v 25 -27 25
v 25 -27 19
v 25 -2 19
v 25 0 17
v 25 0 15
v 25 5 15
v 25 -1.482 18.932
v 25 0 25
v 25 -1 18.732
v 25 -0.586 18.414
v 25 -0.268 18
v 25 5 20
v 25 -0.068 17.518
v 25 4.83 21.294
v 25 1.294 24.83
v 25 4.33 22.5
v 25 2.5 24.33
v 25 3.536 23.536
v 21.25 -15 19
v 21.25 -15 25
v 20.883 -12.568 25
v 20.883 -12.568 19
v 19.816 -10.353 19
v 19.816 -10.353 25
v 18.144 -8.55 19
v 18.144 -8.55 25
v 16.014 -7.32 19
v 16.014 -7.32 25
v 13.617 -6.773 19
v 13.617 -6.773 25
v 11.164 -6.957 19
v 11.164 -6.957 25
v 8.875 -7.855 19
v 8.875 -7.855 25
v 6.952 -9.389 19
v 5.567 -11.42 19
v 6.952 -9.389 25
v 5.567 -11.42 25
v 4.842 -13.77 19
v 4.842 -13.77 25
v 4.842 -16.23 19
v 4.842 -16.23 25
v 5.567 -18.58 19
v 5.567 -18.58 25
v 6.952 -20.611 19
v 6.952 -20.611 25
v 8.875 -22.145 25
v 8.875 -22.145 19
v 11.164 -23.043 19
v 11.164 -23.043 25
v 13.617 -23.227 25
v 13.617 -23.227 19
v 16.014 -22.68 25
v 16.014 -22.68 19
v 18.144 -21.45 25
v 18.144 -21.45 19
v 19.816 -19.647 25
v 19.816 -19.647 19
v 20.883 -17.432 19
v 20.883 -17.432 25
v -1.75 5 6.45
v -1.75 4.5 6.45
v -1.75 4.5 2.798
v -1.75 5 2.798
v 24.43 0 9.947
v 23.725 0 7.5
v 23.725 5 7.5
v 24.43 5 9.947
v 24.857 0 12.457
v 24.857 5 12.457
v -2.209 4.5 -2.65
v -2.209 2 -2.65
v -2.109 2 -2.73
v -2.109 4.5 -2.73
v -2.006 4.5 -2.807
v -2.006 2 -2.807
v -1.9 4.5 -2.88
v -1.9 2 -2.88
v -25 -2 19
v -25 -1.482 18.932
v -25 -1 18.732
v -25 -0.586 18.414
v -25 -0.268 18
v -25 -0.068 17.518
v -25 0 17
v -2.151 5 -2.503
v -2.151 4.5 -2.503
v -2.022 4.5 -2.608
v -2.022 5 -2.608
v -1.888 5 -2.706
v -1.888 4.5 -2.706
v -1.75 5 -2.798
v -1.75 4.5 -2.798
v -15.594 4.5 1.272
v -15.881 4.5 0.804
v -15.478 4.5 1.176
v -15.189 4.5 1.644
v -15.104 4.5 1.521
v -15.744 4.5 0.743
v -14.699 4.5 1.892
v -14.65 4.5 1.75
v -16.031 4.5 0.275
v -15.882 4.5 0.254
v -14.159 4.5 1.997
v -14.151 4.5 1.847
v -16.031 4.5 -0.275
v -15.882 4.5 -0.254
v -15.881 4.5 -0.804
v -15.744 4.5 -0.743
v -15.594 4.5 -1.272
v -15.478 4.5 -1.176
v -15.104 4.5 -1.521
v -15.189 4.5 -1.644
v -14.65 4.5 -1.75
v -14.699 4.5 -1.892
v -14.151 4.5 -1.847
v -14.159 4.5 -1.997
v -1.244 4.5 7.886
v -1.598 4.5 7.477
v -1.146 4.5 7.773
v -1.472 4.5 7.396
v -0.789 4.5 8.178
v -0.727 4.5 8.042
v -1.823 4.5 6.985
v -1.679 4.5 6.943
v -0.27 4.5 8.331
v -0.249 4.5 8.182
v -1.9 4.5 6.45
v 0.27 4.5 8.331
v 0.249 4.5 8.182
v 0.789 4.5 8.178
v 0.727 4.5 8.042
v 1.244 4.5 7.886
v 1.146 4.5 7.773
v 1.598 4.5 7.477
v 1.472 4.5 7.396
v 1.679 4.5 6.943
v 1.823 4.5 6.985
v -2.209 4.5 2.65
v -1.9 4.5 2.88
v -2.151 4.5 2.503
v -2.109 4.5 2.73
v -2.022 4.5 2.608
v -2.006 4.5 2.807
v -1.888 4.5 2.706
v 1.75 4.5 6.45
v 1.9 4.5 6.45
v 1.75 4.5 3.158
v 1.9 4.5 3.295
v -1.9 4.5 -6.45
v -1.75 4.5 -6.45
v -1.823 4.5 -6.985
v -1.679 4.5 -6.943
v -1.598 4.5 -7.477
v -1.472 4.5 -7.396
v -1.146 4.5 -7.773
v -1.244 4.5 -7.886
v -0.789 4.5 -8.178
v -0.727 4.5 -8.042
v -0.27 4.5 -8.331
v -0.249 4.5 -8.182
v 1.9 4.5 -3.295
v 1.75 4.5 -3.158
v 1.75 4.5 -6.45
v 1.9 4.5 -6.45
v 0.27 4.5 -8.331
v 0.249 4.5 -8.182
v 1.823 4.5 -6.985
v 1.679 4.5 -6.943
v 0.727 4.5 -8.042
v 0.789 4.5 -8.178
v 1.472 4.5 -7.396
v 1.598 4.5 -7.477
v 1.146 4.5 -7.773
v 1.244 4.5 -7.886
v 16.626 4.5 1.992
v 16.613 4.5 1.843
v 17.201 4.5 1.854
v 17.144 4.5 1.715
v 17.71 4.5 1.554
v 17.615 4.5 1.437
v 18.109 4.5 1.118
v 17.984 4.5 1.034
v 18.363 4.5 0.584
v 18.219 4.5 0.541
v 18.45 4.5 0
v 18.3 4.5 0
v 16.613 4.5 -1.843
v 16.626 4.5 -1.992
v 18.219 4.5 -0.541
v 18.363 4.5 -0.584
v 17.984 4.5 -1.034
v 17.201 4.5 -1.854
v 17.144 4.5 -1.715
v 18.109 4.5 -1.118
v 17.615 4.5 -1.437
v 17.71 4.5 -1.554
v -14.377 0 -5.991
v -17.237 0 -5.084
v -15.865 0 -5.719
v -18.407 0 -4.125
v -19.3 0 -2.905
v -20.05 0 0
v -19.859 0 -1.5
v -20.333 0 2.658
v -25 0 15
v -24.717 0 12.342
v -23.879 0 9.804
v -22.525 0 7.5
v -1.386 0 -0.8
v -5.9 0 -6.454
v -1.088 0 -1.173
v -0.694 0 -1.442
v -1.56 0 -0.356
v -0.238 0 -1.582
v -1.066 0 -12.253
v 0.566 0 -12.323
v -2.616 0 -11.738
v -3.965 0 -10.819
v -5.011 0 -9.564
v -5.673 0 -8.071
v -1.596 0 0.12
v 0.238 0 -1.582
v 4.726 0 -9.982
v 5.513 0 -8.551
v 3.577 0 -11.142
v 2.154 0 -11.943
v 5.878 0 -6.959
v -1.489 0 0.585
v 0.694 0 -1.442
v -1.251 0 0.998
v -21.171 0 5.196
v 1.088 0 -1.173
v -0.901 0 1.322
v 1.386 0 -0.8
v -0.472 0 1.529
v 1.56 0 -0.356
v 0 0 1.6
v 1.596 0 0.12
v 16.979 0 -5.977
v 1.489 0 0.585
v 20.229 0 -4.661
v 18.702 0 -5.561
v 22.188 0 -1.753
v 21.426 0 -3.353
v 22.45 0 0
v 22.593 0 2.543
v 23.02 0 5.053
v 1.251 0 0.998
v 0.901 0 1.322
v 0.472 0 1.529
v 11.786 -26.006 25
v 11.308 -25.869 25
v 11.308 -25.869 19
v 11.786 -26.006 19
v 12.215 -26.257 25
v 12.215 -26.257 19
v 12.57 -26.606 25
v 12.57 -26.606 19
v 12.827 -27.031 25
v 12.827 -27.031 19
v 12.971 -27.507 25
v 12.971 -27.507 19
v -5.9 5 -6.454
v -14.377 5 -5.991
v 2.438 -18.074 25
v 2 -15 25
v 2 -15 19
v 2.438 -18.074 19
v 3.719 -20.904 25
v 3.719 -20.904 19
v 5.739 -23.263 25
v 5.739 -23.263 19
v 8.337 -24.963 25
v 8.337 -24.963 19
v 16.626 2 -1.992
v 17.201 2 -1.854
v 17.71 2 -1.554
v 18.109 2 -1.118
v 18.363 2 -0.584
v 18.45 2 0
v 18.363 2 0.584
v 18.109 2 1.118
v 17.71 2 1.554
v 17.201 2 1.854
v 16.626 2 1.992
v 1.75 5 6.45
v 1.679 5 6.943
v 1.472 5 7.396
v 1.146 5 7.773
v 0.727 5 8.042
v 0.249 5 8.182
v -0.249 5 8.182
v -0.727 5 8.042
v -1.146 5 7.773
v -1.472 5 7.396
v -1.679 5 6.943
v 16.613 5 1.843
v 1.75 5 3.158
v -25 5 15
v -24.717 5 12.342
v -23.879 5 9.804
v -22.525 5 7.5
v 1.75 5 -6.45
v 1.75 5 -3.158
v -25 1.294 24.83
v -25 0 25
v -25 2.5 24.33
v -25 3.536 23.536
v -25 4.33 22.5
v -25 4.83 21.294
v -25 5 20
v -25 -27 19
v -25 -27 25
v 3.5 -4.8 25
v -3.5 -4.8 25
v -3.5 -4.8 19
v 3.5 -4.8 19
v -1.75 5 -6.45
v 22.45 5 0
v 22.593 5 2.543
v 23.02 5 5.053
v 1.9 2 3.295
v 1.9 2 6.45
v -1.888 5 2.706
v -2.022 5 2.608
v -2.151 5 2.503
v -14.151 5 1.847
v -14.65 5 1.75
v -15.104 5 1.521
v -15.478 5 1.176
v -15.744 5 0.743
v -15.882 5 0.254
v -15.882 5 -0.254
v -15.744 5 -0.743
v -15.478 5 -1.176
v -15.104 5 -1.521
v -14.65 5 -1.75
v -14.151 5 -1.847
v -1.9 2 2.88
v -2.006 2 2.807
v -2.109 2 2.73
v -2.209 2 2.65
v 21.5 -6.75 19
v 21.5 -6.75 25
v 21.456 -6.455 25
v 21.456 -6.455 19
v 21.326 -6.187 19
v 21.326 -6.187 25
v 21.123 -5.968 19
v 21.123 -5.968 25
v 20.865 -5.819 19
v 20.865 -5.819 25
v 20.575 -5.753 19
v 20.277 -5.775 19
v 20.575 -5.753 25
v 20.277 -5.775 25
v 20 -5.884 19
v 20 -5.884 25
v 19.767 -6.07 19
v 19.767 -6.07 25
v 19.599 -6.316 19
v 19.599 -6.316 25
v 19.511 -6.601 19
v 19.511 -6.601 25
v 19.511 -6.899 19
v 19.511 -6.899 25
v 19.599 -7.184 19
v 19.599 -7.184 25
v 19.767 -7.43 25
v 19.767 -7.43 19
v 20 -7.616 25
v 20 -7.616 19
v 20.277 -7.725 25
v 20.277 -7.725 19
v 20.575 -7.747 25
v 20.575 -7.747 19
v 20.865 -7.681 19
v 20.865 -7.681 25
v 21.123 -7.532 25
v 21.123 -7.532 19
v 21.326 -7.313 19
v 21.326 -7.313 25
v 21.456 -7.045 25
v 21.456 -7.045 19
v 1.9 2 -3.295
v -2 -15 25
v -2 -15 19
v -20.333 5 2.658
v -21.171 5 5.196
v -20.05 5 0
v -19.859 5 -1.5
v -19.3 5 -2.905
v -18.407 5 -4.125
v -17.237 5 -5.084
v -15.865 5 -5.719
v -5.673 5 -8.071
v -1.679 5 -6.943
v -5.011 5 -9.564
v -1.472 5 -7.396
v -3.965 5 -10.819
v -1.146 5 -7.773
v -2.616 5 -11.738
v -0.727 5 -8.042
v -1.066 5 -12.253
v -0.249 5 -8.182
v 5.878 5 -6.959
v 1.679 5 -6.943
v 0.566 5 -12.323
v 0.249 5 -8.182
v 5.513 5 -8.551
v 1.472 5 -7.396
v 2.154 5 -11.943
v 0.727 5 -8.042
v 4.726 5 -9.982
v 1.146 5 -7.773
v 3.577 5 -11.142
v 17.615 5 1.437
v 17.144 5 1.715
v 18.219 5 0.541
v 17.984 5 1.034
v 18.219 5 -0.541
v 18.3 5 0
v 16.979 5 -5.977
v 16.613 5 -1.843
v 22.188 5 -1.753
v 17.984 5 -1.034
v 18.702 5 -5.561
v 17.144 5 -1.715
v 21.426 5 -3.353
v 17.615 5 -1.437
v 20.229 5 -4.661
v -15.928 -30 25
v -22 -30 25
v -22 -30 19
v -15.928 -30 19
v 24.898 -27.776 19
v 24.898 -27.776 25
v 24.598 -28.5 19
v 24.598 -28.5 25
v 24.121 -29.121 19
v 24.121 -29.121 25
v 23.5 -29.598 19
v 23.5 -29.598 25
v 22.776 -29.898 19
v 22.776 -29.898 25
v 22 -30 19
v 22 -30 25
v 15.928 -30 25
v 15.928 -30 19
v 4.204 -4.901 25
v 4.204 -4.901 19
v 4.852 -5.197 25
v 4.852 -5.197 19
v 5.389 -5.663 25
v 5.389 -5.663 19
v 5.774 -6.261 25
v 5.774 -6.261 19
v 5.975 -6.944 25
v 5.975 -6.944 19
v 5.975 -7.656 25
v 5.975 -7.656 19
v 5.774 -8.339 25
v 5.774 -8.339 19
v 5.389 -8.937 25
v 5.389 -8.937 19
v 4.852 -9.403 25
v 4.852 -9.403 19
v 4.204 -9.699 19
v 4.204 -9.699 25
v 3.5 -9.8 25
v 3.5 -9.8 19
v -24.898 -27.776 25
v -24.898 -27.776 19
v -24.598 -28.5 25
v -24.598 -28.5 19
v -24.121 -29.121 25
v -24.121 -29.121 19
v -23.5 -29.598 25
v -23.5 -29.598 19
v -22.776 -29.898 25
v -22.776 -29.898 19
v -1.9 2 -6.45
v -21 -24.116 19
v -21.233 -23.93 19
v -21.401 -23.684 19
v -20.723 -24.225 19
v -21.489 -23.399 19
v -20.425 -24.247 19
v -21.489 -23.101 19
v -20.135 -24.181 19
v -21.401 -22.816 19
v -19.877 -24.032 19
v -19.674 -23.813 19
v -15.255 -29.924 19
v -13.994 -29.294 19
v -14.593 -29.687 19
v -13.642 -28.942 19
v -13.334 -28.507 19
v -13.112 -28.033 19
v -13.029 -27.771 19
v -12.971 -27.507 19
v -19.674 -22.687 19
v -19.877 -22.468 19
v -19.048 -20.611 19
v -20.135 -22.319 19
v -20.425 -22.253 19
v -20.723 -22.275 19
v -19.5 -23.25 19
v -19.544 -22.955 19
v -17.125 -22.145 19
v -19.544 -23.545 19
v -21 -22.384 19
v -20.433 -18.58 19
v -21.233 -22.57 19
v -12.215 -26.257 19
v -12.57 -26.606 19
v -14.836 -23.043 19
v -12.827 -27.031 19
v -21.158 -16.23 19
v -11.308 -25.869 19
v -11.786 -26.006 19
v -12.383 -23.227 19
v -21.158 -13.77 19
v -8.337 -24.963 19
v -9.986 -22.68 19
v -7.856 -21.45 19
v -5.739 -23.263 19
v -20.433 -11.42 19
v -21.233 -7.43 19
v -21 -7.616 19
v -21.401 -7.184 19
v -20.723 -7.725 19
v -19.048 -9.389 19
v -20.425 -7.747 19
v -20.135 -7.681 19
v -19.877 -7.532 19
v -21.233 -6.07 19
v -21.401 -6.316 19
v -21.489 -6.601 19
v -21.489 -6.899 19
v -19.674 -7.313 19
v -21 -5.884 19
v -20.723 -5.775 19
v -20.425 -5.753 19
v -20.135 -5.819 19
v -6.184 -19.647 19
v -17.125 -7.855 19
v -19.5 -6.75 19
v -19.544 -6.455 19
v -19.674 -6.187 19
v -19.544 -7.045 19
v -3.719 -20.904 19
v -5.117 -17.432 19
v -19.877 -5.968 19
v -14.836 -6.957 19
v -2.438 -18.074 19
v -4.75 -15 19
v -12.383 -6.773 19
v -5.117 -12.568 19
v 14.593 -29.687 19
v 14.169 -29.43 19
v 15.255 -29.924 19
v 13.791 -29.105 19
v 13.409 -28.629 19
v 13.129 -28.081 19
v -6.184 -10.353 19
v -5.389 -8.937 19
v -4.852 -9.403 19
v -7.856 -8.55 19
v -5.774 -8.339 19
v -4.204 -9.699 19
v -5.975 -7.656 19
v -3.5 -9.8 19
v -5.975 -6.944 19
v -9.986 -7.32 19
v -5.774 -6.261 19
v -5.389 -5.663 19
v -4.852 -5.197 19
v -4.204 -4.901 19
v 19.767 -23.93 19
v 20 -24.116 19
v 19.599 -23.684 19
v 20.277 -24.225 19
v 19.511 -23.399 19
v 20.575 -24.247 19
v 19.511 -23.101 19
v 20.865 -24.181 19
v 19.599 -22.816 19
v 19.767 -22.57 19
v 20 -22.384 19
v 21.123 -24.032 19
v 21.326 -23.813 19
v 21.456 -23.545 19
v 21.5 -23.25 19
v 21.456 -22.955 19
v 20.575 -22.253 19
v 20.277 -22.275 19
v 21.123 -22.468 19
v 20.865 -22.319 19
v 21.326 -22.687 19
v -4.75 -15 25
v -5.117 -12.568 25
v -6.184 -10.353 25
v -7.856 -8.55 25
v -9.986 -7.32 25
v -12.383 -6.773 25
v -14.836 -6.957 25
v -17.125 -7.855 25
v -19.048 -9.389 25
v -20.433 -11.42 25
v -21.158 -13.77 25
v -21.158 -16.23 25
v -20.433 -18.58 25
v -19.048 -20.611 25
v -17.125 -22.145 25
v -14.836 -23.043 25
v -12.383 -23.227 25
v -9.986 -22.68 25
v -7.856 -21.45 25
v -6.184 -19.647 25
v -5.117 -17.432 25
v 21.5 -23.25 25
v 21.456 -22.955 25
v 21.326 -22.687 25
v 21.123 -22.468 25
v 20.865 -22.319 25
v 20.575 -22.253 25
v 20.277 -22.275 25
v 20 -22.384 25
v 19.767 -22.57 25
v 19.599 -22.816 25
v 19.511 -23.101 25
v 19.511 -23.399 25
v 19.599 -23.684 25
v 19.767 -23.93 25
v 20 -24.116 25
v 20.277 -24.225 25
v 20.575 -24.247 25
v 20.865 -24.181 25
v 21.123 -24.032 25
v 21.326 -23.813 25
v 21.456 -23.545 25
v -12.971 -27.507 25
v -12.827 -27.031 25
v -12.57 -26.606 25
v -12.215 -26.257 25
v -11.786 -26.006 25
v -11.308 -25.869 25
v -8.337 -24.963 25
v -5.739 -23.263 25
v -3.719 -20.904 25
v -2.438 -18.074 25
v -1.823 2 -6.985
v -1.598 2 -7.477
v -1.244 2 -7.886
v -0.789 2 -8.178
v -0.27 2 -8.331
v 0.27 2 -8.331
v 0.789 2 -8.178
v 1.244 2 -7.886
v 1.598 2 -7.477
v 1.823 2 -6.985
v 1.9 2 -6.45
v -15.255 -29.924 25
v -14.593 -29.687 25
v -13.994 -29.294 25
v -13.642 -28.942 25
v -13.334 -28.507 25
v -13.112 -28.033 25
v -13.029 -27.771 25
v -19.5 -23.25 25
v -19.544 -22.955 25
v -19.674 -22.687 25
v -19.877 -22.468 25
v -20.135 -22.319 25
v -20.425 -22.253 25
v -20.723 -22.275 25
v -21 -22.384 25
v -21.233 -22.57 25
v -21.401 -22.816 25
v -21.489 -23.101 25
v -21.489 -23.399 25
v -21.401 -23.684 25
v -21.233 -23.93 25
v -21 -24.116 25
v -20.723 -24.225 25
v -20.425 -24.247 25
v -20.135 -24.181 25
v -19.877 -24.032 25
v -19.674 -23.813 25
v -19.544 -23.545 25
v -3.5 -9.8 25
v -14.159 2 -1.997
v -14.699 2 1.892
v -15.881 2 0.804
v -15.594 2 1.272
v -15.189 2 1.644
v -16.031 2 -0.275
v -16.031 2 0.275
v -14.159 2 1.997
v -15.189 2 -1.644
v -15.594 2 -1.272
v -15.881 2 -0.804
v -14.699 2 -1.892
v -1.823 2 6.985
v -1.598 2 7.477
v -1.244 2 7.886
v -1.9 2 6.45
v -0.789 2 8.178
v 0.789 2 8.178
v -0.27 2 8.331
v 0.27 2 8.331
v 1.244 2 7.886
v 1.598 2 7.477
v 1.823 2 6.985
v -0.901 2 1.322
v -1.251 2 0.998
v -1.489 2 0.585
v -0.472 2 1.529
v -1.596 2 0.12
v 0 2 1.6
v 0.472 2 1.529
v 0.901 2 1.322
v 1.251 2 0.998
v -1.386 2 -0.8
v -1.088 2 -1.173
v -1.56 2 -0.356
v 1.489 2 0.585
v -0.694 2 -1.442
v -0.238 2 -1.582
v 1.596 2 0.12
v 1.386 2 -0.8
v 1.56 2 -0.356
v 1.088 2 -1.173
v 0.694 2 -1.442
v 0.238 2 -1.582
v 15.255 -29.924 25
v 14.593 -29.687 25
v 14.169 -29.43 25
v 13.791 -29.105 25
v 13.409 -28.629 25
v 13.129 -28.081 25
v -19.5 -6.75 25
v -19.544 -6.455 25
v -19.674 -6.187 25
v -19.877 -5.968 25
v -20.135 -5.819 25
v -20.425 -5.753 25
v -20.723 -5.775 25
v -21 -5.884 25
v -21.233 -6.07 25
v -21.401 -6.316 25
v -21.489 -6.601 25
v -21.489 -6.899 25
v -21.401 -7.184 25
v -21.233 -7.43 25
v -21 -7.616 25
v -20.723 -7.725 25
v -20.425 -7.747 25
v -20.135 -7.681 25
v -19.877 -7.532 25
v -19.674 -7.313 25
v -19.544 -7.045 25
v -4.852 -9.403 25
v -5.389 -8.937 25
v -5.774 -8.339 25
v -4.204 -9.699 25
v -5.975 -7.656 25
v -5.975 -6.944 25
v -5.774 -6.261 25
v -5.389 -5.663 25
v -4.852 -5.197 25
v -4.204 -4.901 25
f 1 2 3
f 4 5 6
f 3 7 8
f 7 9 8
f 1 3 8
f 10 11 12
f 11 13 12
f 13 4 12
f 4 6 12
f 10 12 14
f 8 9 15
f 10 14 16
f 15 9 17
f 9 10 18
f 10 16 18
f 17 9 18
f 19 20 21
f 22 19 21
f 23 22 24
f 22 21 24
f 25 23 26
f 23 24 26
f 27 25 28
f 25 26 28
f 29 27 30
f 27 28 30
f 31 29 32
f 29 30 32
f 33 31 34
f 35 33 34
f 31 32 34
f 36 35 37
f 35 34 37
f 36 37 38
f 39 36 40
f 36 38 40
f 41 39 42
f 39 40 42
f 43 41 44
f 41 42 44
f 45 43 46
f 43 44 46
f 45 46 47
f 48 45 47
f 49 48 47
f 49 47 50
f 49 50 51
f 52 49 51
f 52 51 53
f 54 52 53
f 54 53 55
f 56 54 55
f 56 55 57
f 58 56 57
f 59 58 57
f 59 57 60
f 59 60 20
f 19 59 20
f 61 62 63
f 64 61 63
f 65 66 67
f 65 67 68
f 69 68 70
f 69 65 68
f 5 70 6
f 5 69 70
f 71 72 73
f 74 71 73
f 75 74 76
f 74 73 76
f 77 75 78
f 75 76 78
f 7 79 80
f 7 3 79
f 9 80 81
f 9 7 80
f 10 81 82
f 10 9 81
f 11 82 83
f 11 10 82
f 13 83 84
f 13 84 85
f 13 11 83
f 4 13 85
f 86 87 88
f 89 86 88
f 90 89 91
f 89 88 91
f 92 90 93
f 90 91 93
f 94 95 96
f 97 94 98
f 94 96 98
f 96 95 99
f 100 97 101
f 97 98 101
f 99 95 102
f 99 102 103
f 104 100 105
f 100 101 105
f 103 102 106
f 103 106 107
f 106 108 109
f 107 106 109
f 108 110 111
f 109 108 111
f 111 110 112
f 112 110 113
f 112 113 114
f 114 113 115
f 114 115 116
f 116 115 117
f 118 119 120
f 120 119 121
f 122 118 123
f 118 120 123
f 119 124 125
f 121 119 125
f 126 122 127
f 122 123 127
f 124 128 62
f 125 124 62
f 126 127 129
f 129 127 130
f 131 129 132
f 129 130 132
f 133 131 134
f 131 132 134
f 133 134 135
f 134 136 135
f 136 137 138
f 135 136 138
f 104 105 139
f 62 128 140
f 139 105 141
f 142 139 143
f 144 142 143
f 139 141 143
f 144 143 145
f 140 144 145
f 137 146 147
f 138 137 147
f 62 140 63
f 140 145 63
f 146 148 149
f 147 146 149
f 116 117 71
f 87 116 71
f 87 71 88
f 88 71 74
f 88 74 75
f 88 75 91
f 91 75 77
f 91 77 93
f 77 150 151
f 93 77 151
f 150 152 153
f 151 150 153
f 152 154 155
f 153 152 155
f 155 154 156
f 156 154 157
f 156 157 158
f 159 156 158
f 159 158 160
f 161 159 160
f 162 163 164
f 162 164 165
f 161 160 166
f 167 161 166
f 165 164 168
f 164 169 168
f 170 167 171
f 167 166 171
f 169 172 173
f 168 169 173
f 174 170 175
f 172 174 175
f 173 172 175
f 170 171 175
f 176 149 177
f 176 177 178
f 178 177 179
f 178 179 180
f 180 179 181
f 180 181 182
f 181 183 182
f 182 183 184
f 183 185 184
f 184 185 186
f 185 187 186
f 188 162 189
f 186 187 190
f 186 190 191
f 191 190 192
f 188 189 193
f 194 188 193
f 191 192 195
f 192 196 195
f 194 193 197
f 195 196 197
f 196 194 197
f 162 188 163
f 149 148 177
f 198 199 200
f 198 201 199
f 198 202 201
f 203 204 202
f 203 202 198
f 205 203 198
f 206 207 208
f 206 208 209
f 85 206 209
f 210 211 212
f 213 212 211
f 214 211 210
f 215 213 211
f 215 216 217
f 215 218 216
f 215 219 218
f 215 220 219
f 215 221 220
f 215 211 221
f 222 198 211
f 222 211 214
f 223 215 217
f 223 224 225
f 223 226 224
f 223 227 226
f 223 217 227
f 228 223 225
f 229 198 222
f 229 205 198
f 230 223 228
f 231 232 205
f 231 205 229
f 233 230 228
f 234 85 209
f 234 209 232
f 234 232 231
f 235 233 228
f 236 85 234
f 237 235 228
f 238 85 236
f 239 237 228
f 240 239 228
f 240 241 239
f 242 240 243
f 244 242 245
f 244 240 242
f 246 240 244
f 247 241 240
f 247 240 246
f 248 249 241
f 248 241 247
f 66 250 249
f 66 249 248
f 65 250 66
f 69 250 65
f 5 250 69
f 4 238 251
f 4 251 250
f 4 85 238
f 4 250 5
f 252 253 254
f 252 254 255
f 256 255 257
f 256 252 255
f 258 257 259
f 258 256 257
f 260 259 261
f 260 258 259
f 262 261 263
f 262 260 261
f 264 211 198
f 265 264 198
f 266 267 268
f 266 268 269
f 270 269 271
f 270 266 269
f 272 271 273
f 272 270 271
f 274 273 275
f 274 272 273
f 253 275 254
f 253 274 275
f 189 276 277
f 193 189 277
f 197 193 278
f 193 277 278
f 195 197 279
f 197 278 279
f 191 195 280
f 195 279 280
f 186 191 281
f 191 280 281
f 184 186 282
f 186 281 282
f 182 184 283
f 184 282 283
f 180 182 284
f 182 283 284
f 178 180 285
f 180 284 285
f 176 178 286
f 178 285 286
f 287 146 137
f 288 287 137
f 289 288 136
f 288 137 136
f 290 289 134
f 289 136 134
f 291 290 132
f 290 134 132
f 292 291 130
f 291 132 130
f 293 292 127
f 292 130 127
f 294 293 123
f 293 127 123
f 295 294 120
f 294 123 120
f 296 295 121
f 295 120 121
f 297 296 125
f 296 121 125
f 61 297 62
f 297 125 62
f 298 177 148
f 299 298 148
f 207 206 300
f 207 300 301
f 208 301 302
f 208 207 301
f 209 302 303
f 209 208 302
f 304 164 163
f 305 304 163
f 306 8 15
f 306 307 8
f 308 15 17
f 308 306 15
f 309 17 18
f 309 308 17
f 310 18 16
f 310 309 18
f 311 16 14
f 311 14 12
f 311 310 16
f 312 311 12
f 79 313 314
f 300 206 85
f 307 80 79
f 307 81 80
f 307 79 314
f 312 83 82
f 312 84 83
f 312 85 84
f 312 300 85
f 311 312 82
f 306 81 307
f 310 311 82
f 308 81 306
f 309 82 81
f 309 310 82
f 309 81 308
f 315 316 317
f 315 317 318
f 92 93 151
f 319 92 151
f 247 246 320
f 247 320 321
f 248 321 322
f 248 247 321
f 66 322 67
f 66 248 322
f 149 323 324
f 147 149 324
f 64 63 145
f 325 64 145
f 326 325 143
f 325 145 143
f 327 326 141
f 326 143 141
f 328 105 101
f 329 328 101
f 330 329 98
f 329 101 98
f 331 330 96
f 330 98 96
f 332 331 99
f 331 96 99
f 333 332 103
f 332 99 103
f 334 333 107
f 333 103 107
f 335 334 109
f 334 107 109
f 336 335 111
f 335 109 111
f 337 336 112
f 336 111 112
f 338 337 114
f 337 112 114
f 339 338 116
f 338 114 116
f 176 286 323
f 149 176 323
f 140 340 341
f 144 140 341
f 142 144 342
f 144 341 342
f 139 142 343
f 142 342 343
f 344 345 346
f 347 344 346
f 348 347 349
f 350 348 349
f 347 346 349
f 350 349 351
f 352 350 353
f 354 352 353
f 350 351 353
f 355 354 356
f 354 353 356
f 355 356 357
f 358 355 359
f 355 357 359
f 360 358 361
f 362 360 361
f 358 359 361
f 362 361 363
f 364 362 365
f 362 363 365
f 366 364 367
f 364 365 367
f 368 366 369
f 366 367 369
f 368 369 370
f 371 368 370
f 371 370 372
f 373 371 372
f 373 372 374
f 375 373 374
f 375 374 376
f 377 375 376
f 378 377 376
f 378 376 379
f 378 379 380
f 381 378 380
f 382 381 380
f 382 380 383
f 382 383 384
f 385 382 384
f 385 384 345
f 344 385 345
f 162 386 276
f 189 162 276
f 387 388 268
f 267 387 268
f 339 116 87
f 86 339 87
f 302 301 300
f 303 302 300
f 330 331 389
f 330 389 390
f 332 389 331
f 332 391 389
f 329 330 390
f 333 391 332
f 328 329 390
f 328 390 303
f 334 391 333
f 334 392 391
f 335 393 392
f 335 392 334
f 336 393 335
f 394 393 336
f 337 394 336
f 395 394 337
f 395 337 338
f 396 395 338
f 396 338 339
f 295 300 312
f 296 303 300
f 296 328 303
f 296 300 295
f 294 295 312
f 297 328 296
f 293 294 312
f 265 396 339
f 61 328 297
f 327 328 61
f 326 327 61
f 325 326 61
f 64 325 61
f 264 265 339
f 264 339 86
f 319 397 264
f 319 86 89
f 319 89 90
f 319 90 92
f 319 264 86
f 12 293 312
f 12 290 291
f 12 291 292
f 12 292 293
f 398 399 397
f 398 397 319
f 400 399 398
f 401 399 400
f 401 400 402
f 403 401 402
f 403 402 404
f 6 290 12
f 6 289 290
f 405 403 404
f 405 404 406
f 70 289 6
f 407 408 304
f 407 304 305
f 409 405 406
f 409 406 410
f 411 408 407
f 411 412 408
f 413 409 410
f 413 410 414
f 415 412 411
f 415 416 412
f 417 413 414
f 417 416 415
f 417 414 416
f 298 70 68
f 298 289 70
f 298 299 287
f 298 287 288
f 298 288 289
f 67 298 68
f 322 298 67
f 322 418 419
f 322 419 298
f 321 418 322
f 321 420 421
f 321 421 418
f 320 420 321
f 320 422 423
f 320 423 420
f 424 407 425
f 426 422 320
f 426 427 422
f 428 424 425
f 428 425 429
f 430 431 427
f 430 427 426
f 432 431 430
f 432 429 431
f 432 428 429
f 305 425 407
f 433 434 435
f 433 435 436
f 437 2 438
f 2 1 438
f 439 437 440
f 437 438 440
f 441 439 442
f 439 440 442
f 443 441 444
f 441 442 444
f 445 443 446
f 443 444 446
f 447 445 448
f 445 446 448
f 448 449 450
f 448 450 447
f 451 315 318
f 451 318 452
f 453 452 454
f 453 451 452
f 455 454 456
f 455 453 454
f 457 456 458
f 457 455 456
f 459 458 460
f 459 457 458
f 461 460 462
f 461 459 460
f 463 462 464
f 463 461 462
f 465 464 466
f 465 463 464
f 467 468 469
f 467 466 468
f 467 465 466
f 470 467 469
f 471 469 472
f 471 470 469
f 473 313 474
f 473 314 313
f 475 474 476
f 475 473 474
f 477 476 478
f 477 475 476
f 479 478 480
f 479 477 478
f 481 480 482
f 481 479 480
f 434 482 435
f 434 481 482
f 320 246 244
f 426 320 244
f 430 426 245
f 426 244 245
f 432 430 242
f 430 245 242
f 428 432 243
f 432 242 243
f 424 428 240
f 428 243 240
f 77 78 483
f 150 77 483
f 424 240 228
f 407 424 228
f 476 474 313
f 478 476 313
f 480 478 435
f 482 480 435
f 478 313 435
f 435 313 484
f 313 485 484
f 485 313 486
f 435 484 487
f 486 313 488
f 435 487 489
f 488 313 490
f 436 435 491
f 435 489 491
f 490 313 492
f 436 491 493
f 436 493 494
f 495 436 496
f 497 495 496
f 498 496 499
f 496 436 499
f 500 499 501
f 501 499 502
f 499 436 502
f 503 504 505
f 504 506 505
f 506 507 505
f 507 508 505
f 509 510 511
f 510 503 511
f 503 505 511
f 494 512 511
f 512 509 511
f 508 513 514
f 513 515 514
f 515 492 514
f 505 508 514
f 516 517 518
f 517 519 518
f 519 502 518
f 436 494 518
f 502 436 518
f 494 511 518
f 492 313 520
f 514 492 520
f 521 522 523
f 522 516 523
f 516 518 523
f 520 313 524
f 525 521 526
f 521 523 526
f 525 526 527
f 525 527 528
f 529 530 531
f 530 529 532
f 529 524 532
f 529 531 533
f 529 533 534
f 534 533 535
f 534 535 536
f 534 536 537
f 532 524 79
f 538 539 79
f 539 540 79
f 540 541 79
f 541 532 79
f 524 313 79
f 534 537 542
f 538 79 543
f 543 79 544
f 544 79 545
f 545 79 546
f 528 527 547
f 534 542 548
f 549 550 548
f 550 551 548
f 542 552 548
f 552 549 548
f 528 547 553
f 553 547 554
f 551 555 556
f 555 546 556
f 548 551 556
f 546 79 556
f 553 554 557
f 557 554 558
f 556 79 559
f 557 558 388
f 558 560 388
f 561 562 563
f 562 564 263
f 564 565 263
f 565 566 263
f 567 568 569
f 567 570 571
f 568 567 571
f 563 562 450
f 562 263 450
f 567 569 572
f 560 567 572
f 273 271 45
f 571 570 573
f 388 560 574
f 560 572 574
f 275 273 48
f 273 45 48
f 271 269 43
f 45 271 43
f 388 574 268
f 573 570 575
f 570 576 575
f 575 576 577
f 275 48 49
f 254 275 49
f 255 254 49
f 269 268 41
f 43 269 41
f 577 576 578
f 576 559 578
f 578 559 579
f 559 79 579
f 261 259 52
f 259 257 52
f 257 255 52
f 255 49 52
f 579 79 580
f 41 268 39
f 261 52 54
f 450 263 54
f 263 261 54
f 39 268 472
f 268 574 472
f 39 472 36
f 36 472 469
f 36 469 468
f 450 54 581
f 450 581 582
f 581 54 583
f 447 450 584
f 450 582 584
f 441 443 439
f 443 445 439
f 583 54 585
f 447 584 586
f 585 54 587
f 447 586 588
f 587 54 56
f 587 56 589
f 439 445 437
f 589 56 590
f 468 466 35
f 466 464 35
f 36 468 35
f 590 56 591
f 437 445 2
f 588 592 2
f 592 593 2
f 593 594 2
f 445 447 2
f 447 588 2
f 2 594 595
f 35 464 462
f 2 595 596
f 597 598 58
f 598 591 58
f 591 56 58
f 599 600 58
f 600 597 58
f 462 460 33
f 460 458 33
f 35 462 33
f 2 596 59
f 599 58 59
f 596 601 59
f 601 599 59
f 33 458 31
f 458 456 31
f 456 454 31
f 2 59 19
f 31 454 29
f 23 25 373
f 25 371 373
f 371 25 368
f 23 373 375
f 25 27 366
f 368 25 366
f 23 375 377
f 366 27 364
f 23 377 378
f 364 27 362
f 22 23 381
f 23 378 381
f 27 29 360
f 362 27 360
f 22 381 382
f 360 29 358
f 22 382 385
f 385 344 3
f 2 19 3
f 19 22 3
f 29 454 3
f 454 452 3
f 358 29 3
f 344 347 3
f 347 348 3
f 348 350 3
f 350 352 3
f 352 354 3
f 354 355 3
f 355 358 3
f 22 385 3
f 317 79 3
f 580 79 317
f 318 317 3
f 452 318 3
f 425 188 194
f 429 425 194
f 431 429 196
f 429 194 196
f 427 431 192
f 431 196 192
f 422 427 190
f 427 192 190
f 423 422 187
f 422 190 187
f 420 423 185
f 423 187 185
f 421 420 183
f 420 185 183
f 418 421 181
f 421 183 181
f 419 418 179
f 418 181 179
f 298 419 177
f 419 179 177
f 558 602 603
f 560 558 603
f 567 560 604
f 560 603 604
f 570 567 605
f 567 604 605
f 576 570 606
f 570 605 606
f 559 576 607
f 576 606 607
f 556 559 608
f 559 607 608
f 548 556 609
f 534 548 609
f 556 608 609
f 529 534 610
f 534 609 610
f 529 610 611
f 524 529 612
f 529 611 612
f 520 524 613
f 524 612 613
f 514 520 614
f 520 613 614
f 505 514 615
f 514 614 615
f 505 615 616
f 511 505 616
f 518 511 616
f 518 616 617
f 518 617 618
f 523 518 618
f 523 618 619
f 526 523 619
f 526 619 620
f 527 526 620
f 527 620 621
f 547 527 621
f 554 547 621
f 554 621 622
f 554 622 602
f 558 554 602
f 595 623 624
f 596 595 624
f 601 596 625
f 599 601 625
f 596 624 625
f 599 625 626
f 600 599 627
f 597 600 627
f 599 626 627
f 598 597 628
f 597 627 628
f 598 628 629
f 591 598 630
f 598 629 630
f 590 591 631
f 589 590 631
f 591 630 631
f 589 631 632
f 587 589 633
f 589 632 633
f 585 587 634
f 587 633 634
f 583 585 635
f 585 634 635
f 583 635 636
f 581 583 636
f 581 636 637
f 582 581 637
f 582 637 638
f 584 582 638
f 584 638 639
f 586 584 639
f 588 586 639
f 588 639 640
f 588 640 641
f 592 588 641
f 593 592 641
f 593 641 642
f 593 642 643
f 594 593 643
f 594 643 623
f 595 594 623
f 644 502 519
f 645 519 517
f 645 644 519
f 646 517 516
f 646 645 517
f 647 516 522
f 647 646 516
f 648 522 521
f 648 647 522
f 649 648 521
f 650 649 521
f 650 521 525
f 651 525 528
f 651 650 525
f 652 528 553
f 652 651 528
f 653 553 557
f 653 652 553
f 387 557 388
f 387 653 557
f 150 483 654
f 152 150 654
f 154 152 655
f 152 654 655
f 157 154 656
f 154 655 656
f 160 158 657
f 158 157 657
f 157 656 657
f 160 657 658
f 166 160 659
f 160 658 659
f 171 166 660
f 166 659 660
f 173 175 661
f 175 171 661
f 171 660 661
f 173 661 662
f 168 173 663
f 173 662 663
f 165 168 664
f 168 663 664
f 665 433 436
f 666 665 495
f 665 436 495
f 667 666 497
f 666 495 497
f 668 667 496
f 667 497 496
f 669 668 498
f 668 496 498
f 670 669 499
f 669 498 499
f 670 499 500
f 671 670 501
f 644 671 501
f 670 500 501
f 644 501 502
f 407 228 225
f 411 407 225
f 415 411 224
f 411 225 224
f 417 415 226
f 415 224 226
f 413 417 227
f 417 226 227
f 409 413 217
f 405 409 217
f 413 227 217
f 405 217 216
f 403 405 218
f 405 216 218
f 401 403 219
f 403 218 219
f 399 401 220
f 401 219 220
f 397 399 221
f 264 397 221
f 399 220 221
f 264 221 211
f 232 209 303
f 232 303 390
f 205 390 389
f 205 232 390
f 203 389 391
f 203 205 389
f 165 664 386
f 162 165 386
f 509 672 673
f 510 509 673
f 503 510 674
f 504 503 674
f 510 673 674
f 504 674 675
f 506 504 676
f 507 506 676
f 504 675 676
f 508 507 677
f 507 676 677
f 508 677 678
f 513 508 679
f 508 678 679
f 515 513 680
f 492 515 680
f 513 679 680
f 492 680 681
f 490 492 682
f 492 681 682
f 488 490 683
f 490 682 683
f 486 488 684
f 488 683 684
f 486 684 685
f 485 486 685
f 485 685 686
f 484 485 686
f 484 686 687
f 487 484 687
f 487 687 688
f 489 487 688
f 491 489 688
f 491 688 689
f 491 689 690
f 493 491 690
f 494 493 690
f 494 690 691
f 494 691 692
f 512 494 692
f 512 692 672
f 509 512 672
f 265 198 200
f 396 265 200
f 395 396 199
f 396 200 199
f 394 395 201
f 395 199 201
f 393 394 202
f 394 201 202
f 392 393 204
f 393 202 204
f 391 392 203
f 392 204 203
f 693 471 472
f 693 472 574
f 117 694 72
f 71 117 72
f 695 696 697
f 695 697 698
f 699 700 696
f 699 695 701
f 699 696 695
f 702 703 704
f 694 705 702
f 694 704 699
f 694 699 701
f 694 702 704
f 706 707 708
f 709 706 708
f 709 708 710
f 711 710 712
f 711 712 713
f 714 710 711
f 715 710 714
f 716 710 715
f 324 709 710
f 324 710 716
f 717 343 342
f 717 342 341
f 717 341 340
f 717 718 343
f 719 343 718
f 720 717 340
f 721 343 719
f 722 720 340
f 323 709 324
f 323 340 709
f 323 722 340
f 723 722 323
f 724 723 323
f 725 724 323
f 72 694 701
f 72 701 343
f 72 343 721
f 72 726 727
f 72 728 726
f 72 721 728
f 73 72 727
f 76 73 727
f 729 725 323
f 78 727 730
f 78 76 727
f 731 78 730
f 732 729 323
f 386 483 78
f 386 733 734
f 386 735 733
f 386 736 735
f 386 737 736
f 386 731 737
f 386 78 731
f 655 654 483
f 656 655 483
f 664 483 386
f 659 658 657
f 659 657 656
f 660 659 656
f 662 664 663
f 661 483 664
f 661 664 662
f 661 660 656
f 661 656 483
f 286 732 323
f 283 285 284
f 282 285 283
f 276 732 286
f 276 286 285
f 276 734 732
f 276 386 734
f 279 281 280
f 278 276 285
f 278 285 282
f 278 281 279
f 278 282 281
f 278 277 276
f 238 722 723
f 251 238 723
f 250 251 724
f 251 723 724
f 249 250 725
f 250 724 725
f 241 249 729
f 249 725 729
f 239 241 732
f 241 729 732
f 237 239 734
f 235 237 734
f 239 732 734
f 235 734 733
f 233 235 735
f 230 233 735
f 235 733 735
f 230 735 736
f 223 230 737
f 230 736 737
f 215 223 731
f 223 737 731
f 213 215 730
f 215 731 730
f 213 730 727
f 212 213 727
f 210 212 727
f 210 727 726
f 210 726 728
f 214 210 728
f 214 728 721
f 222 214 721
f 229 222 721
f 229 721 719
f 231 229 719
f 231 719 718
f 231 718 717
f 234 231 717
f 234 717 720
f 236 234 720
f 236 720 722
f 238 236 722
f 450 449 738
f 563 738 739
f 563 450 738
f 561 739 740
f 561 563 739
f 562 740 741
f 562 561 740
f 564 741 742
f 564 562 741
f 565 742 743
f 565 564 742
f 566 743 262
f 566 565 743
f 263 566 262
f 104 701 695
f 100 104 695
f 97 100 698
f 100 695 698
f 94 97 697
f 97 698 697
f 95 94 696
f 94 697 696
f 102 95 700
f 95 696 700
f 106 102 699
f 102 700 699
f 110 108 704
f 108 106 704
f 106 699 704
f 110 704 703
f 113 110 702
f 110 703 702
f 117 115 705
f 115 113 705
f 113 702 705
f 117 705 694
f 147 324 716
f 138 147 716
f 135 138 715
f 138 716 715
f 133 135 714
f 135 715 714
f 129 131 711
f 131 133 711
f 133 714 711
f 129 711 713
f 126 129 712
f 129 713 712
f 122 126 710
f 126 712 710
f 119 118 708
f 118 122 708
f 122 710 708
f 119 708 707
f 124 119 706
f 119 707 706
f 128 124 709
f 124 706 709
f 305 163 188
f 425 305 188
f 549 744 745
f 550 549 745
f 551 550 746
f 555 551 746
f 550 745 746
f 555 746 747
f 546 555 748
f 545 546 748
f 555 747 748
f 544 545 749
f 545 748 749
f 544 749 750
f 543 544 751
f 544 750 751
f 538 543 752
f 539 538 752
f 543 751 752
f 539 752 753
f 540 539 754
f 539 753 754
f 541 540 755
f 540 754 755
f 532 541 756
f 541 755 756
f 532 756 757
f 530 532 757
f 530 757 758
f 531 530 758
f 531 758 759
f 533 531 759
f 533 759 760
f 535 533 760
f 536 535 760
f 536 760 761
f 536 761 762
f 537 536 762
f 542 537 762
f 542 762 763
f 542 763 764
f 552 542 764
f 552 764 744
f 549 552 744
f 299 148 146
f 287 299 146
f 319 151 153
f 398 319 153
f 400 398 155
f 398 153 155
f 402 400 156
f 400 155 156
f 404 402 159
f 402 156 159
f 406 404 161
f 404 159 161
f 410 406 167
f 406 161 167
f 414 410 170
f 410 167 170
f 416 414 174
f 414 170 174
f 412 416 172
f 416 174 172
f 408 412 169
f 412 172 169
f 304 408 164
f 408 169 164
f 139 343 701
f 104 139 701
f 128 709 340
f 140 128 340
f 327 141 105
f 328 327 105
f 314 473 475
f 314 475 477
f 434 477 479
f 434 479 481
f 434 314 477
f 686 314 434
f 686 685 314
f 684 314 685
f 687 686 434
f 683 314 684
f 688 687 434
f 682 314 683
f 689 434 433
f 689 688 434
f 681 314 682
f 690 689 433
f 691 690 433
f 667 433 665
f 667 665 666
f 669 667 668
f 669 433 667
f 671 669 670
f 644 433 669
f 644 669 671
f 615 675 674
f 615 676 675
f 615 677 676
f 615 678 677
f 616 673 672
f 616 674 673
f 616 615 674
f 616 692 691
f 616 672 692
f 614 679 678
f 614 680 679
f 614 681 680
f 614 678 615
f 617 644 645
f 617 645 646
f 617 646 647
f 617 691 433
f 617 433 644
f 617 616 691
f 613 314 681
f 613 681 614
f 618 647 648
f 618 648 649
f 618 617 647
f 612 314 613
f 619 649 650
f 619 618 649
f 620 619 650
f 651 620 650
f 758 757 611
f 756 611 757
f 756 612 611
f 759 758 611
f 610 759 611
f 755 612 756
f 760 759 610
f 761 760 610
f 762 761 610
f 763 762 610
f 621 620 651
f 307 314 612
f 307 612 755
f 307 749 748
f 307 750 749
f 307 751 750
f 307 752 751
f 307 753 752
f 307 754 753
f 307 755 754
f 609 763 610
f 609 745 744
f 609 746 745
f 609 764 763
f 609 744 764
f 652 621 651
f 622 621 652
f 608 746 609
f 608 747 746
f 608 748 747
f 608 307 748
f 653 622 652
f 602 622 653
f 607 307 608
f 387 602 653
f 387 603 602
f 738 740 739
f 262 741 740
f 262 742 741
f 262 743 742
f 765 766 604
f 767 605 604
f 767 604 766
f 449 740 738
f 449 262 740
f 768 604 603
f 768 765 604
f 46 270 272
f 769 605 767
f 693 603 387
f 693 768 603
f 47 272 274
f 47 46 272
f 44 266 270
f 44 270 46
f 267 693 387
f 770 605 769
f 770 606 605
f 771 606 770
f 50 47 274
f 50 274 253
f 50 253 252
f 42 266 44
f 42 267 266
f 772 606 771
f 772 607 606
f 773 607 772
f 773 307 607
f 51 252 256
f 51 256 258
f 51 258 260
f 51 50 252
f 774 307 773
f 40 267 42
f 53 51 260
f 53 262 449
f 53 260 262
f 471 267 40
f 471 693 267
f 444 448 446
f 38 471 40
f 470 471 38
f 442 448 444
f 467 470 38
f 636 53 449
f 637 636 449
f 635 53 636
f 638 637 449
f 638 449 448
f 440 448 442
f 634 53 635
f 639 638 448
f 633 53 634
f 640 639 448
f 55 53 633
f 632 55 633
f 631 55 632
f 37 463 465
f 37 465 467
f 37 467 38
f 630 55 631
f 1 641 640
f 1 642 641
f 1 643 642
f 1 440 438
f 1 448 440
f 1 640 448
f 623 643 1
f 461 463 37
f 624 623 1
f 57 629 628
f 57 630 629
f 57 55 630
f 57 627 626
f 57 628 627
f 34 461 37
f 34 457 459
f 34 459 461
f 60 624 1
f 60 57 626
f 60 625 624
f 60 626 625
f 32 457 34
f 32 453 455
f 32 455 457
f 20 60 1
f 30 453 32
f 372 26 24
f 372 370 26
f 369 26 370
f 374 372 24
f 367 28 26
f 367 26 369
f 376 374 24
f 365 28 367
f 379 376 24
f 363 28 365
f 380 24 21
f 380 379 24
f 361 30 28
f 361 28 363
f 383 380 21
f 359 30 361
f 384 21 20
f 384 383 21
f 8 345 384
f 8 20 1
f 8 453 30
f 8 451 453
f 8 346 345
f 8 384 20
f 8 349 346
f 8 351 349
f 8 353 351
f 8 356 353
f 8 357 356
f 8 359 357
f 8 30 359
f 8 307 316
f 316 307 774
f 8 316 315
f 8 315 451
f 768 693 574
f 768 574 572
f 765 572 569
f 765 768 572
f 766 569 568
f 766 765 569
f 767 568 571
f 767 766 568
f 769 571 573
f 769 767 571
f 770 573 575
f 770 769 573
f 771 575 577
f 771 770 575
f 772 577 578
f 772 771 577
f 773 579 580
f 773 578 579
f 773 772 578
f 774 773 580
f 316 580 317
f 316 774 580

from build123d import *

# Parameters (mm, degrees)
EXTRUDE_THIN1_DEPTH = 5
BOSS_EXTRUDE1_DEPTH = 2
SKETCH3_R           = 1.6
CUT_EXTRUDE1_DEPTH  = 26.797771221
BOSS_EXTRUDE2_DEPTH = 5
SKETCH8_W           = 50
SKETCH8_H           = 6
BOSS_EXTRUDE6_DEPTH = 30
SKETCH10_R          = 8.25
SKETCH10_R_2        = 1
CUT_EXTRUDE2_DEPTH  = 55.037232534
FILLET2_R           = 5
FILLET4_R           = 3
EXTRUDE_THIN2_START = 4.5
EXTRUDE_THIN2_DEPTH = 0.5
FILLET5_R           = 2


# Read off the part's stored shape, not the designer's step: Extrude-Thin1, Boss-Extrude1, Extrude-Thin2
with BuildPart() as part:
    # Extrude-Thin1 outline → Extrude-Thin1 (new body)
    with BuildSketch(Plane(origin=(0, 0, 0), x_dir=(1, 0, 0), z_dir=(0, 1, 0))):
        with BuildLine():
            ThreePointArc((5.878005996, 6.958965141), (-0.252578975, 12.344591068), (-5.899998443, 6.454286146))
            Line((-5.899998443, 6.454286146), (-14.377365901, 5.991062641))
            ThreePointArc((-14.377365901, 5.991062641), (-20.05, 0), (-14.377365901, -5.991062641))
            Line((-14.377365901, -5.991062641), (-5.899998443, -6.454286146))
            ThreePointArc((-5.899998443, -6.454286146), (-0.252578975, -12.344591068), (5.878005996, -6.958965141))
            Line((5.878005996, -6.958965141), (16.97887538, -5.97664545))
            ThreePointArc((16.97887538, -5.97664545), (22.45, 0), (16.97887538, 5.97664545))
            Line((16.97887538, 5.97664545), (5.878005996, 6.958965141))
        make_face()
        with BuildLine():
            Line((-1.9, 2.87967012), (-1.9, 6.45))
            ThreePointArc((-1.9, 6.45), (0, 8.35), (1.9, 6.45))
            Line((1.9, 6.45), (1.9, 3.295349698))
            Line((1.9, 3.295349698), (16.626291793, 1.99221515))
            ThreePointArc((16.626291793, 1.99221515), (18.45, 0), (16.626291793, -1.99221515))
            Line((16.626291793, -1.99221515), (1.9, -3.295349698))
            Line((1.9, -3.295349698), (1.9, -6.45))
            ThreePointArc((1.9, -6.45), (0, -8.35), (-1.9, -6.45))
            Line((-1.9, -6.45), (-1.9, -2.87967012))
            ThreePointArc((-1.9, -2.87967012), (-2.057742861, -2.769150468), (-2.209072203, -2.65))
            Line((-2.209072203, -2.65), (-14.159121967, -1.99702088))
            ThreePointArc((-14.159121967, -1.99702088), (-16.05, 0), (-14.159121967, 1.99702088))
            Line((-14.159121967, 1.99702088), (-2.209072203, 2.65))
            ThreePointArc((-2.209072203, 2.65), (-2.057742861, 2.769150468), (-1.9, 2.87967012))
        make_face(mode=Mode.SUBTRACT)
    extrude(amount=EXTRUDE_THIN1_DEPTH)

    # Boss-Extrude1 outline → Boss-Extrude1 (add)
    with BuildSketch(Plane(origin=(0, 0, 0), x_dir=(1, 0, 0), z_dir=(0, 1, 0))):
        with BuildLine():
            ThreePointArc((1.9, 6.45), (0, 8.35), (-1.9, 6.45))
            Line((-1.9, 6.45), (-1.9, 2.87967012))
            ThreePointArc((-1.9, 2.87967012), (-2.057742861, 2.769150468), (-2.209072203, 2.65))
            Line((-2.209072203, 2.65), (-14.159121967, 1.99702088))
            ThreePointArc((-14.159121967, 1.99702088), (-16.05, 0), (-14.159121967, -1.99702088))
            Line((-14.159121967, -1.99702088), (-2.209072203, -2.65))
            ThreePointArc((-2.209072203, -2.65), (-2.057742861, -2.769150468), (-1.9, -2.87967012))
            Line((-1.9, -2.87967012), (-1.9, -6.45))
            ThreePointArc((-1.9, -6.45), (0, -8.35), (1.9, -6.45))
            Line((1.9, -6.45), (1.9, -3.295349698))
            Line((1.9, -3.295349698), (16.626291793, -1.99221515))
            ThreePointArc((16.626291793, -1.99221515), (18.45, 0), (16.626291793, 1.99221515))
            Line((16.626291793, 1.99221515), (1.9, 3.295349698))
            Line((1.9, 3.295349698), (1.9, 6.45))
        make_face()
    extrude(amount=BOSS_EXTRUDE1_DEPTH)

    # Sketch3 → Cut-Extrude1 (cut, through all)
    with BuildSketch(Plane(origin=(0, 2, 0), x_dir=(1, 0, 0), z_dir=(0, 1, 0))):
        with Locations(Location((0, 0, 0), (0, 0, 270))):
            Circle(SKETCH3_R)
    extrude(amount=-CUT_EXTRUDE1_DEPTH, mode=Mode.SUBTRACT)

    # Sketch4 → Boss-Extrude2 (add)
    # profile 1 of 2: a face of its own
    with BuildSketch(Plane.XZ):
        with BuildLine():
            Line((25, 25), (-25, 25))
            Line((-25, 25), (-25, 15))
            ThreePointArc((-25, 15), (-24.365263739, 11.051087966), (-22.525, 7.5))
            ThreePointArc((-22.525, 7.5), (-20.684736261, 3.948912034), (-20.05, 0))
            ThreePointArc((-20.05, 0), (-18.406844925, 4.125276027), (-14.377365901, 5.991062641))
            Line((-14.377365901, 5.991062641), (-5.899998443, 6.454286146))
            ThreePointArc((-5.899998443, 6.454286146), (-0.252578976, 12.344591068), (5.878005996, 6.958965141))
            Line((5.878005996, 6.958965141), (16.97887538, 5.97664545))
            ThreePointArc((16.97887538, 5.97664545), (20.875678043, 4.051342229), (22.45, 0))
            ThreePointArc((22.45, 0), (22.77102028, 3.803801552), (23.725, 7.5))
            ThreePointArc((23.725, 7.5), (24.67897972, 11.196198448), (25, 15))
            Line((25, 15), (25, 25))
        make_face()
    # profile 2 of 2: a face of its own
    with BuildSketch(Plane.XZ):
        with BuildLine():
            Line((-14.377365901, -5.991062641), (-5.899998443, -6.454286146))
            ThreePointArc((-5.899998443, -6.454286146), (-0.252578976, -12.344591068), (5.878005996, -6.958965141))
            Line((5.878005996, -6.958965141), (16.97887538, -5.97664545))
            ThreePointArc((16.97887538, -5.97664545), (22.45, 0), (16.97887538, 5.97664545))
            Line((16.97887538, 5.97664545), (5.878005996, 6.958965141))
            ThreePointArc((5.878005996, 6.958965141), (-0.252578976, 12.344591068), (-5.899998443, 6.454286146))
            Line((-5.899998443, 6.454286146), (-14.377365901, 5.991062641))
            ThreePointArc((-14.377365901, 5.991062641), (-20.05, 0), (-14.377365901, -5.991062641))
        make_face()
        with BuildLine():
            ThreePointArc((16.626291793, -1.99221515), (18.45, 0), (16.626291793, 1.99221515))
            Line((16.626291793, 1.99221515), (1.9, 3.295349698))
            Line((1.9, 3.295349698), (1.9, 6.45))
            ThreePointArc((1.9, 6.45), (0, 8.35), (-1.9, 6.45))
            Line((-1.9, 6.45), (-1.9, 2.87967012))
            ThreePointArc((-1.9, 2.87967012), (-2.057742862, 2.769150468), (-2.209072203, 2.65))
            Line((-2.209072203, 2.65), (-14.159121967, 1.99702088))
            ThreePointArc((-14.159121967, 1.99702088), (-16.05, 0), (-14.159121967, -1.99702088))
            Line((-14.159121967, -1.99702088), (-2.209072203, -2.65))
            ThreePointArc((-2.209072203, -2.65), (-2.057742862, -2.769150468), (-1.9, -2.87967012))
            Line((-1.9, -2.87967012), (-1.9, -6.45))
            ThreePointArc((-1.9, -6.45), (0, -8.35), (1.9, -6.45))
            Line((1.9, -6.45), (1.9, -3.295349698))
            Line((1.9, -3.295349698), (16.626291793, -1.99221515))
        make_face(mode=Mode.SUBTRACT)
    extrude(amount=-BOSS_EXTRUDE2_DEPTH)

    # Sketch8 → Boss-Extrude6 (add)
    with BuildSketch(Plane.XZ):
        with Locations((0, 22)):
            Rectangle(SKETCH8_W, SKETCH8_H)
    extrude(amount=BOSS_EXTRUDE6_DEPTH)

    # Sketch10 → Cut-Extrude2 (cut, through all)
    with BuildSketch(Plane.XY.offset(25)):
        with Locations((-13, -15)):
            Circle(SKETCH10_R)
        with Locations((13, -15)):
            Circle(SKETCH10_R)
        with Locations((20.5, -6.75)):
            Circle(SKETCH10_R_2)
        with Locations((20.5, -23.25)):
            Circle(SKETCH10_R_2)
        with Locations((-20.5, -23.25)):
            Circle(SKETCH10_R_2)
        with Locations((-20.5, -6.75)):
            Circle(SKETCH10_R_2)
        with BuildLine():
            Line((3.5, -9.8), (-3.5, -9.8))
            ThreePointArc((-3.5, -9.8), (-6, -7.3), (-3.5, -4.8))
            Line((-3.5, -4.8), (3.5, -4.8))
            ThreePointArc((3.5, -4.8), (6, -7.3), (3.5, -9.8))
        make_face()
        with BuildLine():
            Line((-2, -15), (2, -15))
            ThreePointArc((2, -15), (4.644900222, -22.154879991), (11.307692308, -25.869042951))
            ThreePointArc((11.307692308, -25.869042951), (12.519109051, -26.544345307), (13, -27.845232579))
            Line((13, -27.845232579), (13, -30))
            Line((13, -30), (-13, -30))
            Line((-13, -30), (-13, -27.845232579))
            ThreePointArc((-13, -27.845232579), (-12.519109051, -26.544345307), (-11.307692308, -25.869042951))
            ThreePointArc((-11.307692308, -25.869042951), (-4.644900222, -22.154879991), (-2, -15))
        make_face()
    extrude(amount=-CUT_EXTRUDE2_DEPTH, mode=Mode.SUBTRACT)

    # Fillet2
    fillet2_edges = [part.edges().sort_by_distance(p)[0] for p in [
        (0, 5, 25),
    ]]
    fillet(fillet2_edges, radius=FILLET2_R)

    # Fillet4
    fillet4_edges = [part.edges().sort_by_distance(p)[0] for p in [
        (25, -30, 22),
        (-25, -30, 22),
        (13, -30, 22),
        (-13, -30, 22),
    ]]
    fillet(fillet4_edges, radius=FILLET4_R)

    # Extrude-Thin2 outline → Extrude-Thin2 (add)
    with BuildSketch(Plane(origin=(0, 0, 0), x_dir=(1, 0, 0), z_dir=(0, 1, 0)).offset(EXTRUDE_THIN2_START)):
        with BuildLine():
            ThreePointArc((1.9, 6.45), (0, 8.35), (-1.9, 6.45))
            Line((-1.9, 6.45), (-1.9, 2.87967012))
            ThreePointArc((-1.9, 2.87967012), (-2.057742861, 2.769150468), (-2.209072203, 2.65))
            Line((-2.209072203, 2.65), (-14.159121967, 1.99702088))
            ThreePointArc((-14.159121967, 1.99702088), (-16.05, 0), (-14.159121967, -1.99702088))
            Line((-14.159121967, -1.99702088), (-2.209072203, -2.65))
            ThreePointArc((-2.209072203, -2.65), (-2.057742861, -2.769150468), (-1.9, -2.87967012))
            Line((-1.9, -2.87967012), (-1.9, -6.45))
            ThreePointArc((-1.9, -6.45), (0, -8.35), (1.9, -6.45))
            Line((1.9, -6.45), (1.9, -3.295349698))
            Line((1.9, -3.295349698), (16.626291793, -1.99221515))
            ThreePointArc((16.626291793, -1.99221515), (18.45, 0), (16.626291793, 1.99221515))
            Line((16.626291793, 1.99221515), (1.9, 3.295349698))
            Line((1.9, 3.295349698), (1.9, 6.45))
        make_face()
        with BuildLine():
            ThreePointArc((-1.75, -2.797766967), (-1.955868768, -2.657927268), (-2.150613493, -2.502970556))
            Line((-2.150613493, -2.502970556), (-14.15093782, -1.847244314))
            ThreePointArc((-14.15093782, -1.847244314), (-15.9, 0), (-14.15093782, 1.847244314))
            Line((-14.15093782, 1.847244314), (-2.150613493, 2.502970556))
            ThreePointArc((-2.150613493, 2.502970556), (-1.955868768, 2.657927268), (-1.75, 2.797766967))
            Line((-1.75, 2.797766967), (-1.75, 6.45))
            ThreePointArc((-1.75, 6.45), (0, 8.2), (1.75, 6.45))
            Line((1.75, 6.45), (1.75, 3.158037104))
            Line((1.75, 3.158037104), (16.613069909, 1.842799014))
            ThreePointArc((16.613069909, 1.842799014), (18.3, 0), (16.613069909, -1.842799014))
            Line((16.613069909, -1.842799014), (1.75, -3.158037104))
            Line((1.75, -3.158037104), (1.75, -6.45))
            ThreePointArc((1.75, -6.45), (0, -8.2), (-1.75, -6.45))
            Line((-1.75, -6.45), (-1.75, -2.797766967))
        make_face(mode=Mode.SUBTRACT)
    extrude(amount=EXTRUDE_THIN2_DEPTH)

    # Fillet5
    fillet5_edges = [part.edges().sort_by_distance(p)[0] for p in [
        (0, 0, 19),
    ]]
    fillet(fillet5_edges, radius=FILLET5_R)


solid = part.part
